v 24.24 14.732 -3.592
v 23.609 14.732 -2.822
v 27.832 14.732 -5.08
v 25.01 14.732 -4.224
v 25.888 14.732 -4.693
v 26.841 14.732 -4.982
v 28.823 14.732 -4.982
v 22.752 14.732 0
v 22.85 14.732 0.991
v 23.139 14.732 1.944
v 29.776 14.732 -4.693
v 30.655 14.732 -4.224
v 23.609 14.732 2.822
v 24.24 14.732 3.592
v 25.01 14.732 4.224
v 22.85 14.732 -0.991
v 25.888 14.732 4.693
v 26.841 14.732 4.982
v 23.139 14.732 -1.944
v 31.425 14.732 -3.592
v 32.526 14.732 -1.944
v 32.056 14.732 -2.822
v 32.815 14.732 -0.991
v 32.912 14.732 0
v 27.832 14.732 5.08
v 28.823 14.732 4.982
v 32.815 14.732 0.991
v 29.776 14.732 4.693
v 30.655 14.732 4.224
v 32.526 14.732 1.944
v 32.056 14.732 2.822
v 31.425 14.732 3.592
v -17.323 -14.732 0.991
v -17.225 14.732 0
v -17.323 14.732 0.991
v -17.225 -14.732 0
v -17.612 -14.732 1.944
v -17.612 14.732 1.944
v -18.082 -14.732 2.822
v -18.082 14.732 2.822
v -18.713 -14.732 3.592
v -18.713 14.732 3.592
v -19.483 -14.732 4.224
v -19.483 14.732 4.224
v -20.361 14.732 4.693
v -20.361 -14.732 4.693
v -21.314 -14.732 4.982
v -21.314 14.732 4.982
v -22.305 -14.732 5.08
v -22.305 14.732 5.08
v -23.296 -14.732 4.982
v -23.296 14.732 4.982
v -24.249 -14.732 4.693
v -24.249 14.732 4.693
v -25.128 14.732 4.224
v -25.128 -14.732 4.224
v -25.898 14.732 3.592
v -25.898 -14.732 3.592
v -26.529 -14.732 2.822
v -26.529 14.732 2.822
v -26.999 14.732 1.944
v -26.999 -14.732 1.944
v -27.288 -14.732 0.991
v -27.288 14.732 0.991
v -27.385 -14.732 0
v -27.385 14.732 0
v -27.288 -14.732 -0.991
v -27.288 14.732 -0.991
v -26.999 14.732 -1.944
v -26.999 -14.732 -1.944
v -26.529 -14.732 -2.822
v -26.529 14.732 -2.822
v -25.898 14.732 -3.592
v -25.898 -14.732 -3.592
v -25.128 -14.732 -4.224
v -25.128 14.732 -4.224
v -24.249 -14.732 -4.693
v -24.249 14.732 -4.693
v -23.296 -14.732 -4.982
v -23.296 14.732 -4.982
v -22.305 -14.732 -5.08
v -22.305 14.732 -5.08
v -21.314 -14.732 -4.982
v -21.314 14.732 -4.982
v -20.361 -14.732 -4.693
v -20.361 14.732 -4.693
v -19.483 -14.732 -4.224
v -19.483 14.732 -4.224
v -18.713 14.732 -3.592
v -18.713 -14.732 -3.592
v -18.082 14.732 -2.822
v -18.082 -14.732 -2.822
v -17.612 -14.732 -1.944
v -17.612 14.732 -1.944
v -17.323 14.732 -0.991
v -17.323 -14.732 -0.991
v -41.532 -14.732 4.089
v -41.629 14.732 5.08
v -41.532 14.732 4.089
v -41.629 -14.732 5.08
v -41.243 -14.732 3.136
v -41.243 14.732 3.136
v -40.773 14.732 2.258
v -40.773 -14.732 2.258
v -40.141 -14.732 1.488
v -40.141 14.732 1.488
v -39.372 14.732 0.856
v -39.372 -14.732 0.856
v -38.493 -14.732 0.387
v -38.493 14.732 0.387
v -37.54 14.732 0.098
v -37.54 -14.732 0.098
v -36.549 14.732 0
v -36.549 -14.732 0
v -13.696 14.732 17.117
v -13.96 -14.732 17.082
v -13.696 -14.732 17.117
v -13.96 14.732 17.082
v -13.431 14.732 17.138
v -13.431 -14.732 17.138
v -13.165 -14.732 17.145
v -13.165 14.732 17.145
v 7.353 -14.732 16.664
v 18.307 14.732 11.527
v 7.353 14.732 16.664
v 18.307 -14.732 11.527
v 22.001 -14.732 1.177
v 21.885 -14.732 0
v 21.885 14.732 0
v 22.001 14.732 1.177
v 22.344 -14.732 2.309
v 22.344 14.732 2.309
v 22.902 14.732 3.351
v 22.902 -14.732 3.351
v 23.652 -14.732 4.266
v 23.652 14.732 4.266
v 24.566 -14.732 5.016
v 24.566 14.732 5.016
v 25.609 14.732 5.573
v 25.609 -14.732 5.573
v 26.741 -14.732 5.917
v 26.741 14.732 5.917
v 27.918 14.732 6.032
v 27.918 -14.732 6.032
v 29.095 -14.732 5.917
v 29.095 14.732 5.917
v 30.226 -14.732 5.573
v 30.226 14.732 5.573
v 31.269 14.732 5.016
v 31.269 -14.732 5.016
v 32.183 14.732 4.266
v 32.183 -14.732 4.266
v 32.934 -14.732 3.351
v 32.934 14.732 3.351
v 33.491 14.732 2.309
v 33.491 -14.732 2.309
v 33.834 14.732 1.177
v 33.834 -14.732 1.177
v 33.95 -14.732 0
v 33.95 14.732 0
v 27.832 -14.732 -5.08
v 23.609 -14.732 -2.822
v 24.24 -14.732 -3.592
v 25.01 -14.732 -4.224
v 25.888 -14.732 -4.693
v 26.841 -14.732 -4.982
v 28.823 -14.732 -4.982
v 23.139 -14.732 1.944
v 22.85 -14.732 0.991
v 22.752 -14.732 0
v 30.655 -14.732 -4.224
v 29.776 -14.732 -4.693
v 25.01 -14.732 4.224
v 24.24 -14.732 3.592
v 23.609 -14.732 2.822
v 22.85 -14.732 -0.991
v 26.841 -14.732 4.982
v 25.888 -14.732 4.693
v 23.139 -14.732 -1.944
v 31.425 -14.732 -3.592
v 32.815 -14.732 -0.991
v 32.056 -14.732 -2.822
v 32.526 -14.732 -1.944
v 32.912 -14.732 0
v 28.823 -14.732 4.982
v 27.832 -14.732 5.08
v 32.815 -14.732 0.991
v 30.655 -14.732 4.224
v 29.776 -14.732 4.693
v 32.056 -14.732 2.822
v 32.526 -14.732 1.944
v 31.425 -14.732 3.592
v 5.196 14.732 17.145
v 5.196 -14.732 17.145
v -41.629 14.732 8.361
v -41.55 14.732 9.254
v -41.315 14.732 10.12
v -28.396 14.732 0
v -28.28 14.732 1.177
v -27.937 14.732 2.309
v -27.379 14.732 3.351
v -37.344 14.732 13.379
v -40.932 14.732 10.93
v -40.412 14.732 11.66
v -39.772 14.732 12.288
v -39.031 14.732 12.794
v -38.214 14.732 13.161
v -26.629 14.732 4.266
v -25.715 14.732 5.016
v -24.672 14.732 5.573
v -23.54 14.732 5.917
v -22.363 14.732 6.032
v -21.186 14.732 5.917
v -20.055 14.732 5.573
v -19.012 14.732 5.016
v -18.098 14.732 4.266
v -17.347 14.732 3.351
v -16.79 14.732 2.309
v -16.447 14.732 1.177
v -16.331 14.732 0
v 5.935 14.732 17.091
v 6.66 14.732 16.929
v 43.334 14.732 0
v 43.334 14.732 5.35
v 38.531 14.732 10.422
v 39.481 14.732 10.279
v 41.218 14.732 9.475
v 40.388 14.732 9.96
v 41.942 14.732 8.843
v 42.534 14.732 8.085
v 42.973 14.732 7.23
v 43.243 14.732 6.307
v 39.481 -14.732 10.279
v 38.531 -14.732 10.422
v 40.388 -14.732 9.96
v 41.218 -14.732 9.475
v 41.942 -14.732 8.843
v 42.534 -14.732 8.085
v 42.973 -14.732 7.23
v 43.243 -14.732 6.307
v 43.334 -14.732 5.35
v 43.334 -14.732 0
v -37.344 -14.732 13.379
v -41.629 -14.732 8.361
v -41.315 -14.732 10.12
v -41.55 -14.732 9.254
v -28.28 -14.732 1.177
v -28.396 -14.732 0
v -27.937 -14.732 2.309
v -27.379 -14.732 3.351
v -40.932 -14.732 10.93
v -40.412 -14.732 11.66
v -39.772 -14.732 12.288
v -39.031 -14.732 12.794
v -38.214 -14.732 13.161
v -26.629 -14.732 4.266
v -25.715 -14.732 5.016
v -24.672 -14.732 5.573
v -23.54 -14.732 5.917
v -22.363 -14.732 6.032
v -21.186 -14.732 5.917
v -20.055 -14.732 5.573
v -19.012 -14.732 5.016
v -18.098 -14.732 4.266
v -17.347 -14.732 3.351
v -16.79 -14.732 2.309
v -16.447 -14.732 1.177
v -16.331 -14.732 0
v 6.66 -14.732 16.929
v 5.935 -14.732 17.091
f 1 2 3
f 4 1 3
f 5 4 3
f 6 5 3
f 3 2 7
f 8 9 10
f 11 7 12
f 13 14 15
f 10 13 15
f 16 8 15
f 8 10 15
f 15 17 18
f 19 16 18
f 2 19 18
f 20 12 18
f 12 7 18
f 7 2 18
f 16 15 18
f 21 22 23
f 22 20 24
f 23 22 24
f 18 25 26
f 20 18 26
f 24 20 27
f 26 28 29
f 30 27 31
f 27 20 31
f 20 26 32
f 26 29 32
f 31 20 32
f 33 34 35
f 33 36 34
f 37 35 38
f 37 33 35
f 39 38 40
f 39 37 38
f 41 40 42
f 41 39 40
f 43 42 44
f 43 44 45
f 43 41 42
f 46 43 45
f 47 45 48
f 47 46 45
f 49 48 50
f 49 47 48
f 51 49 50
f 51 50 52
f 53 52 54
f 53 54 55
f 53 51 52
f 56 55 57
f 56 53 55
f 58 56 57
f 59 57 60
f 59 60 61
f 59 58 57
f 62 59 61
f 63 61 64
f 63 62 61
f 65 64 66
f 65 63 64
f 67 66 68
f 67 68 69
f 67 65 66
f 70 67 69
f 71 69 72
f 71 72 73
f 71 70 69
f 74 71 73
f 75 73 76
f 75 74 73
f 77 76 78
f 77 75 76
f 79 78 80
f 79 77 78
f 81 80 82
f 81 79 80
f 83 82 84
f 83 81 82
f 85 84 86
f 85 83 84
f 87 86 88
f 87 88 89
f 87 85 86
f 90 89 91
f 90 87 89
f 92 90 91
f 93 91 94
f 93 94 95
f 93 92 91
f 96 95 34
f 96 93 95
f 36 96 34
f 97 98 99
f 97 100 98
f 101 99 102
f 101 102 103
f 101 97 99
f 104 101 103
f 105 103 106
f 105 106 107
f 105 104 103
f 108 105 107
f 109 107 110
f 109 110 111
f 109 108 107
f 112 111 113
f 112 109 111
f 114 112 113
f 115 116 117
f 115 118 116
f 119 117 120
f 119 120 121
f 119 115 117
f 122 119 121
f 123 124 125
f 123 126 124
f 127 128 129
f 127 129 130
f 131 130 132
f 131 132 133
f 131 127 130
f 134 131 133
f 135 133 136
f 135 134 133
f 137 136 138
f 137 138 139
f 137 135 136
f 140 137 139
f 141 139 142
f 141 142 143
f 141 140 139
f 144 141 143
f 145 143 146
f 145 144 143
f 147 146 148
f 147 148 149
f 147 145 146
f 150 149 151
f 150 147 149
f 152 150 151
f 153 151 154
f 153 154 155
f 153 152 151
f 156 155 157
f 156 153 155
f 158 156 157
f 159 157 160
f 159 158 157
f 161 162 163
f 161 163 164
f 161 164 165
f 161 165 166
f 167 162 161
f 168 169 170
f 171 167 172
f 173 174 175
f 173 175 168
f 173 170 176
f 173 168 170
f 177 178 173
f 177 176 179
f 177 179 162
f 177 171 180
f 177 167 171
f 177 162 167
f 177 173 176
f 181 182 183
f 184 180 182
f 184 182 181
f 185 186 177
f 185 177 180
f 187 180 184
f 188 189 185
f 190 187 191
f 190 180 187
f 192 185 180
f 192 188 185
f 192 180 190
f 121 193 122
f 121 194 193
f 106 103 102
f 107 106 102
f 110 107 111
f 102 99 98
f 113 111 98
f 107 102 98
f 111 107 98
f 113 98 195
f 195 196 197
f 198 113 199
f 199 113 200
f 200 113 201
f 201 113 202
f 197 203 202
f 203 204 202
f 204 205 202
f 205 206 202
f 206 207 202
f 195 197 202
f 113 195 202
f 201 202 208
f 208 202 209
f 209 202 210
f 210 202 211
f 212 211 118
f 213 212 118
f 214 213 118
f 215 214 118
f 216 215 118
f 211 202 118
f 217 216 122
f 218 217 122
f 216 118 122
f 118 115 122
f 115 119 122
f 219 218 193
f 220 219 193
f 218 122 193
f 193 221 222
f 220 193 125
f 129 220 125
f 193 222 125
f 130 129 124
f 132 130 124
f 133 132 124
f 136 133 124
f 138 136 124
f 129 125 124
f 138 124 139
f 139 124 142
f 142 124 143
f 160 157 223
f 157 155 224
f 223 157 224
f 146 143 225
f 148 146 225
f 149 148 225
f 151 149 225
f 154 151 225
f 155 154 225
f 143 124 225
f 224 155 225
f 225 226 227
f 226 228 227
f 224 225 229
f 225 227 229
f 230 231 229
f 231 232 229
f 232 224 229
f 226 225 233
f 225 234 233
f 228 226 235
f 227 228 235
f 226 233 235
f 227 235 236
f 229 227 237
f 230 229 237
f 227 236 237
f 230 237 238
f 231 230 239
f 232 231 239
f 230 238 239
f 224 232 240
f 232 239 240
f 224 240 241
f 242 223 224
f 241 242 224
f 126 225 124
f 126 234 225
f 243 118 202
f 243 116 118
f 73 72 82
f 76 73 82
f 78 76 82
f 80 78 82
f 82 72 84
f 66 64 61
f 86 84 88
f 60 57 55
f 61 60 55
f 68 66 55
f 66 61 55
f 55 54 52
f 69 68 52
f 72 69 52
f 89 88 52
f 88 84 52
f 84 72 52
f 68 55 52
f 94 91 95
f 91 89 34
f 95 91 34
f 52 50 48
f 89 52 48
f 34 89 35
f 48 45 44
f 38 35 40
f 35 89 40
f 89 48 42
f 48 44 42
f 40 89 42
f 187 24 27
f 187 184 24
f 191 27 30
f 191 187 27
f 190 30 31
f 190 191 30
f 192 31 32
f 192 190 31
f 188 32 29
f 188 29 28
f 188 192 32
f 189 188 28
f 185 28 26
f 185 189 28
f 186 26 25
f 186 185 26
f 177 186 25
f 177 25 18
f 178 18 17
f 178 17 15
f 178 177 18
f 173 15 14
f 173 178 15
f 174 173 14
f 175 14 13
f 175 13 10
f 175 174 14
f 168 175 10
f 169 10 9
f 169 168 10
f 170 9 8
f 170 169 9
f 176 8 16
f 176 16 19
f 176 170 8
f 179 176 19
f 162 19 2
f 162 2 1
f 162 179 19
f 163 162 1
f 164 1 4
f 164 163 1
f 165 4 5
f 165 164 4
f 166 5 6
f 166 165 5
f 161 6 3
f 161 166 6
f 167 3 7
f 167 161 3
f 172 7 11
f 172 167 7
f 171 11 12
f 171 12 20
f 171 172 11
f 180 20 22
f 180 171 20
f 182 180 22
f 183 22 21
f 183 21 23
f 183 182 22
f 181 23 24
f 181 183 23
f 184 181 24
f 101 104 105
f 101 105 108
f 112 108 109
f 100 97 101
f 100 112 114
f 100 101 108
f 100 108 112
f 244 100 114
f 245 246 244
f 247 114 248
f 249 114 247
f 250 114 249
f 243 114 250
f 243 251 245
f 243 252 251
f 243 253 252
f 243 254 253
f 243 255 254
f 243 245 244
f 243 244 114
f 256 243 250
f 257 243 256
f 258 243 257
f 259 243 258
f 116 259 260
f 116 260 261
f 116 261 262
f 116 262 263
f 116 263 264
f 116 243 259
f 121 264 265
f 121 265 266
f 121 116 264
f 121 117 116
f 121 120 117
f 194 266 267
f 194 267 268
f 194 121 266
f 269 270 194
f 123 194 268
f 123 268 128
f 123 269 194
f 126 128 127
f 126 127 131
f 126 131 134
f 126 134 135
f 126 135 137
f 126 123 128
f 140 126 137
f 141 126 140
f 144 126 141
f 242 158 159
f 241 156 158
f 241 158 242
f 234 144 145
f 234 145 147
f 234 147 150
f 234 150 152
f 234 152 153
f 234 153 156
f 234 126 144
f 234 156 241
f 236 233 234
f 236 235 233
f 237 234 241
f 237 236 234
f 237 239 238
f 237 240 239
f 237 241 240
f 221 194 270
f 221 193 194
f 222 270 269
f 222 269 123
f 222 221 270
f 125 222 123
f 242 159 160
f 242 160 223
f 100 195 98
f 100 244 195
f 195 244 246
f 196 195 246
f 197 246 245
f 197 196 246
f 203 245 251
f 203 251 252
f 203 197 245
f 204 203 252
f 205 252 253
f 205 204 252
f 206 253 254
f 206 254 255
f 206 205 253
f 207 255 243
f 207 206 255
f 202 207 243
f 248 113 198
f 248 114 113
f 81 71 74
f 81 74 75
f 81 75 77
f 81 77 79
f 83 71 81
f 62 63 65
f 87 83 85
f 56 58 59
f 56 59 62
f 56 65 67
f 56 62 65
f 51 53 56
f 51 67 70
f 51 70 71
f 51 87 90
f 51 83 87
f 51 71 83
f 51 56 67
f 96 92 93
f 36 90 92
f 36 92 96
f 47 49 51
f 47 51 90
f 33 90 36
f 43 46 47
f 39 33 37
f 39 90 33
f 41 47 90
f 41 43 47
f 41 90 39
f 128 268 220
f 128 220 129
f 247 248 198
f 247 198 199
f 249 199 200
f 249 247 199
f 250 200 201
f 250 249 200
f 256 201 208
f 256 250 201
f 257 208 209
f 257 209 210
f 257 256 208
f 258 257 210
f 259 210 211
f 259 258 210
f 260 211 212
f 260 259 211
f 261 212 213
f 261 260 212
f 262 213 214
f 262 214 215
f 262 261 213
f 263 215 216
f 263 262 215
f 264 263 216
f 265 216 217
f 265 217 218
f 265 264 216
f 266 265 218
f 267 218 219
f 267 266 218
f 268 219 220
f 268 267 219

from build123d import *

# Parameters (mm, degrees)
F1_DEPTH = 14.732
F2_R     = 5.08
F3_DEPTH = 14.732
F4_R     = 5.08


with BuildPart() as f1:
    # F0 (on Front) → F1 (new body, symmetric)
    with BuildSketch(Plane.XZ):
        with BuildLine():
            Line((-41.6292596983, 12.7), (-41.6292596983, 0))
            Line((-41.6292596983, 0), (-28.3958129411, 0))
            ThreePointArc((-28.3958129411, 0), (-22.3633129411, 6.0325), (-16.3308129411, 0))
            Line((-16.3308129411, 0), (21.8852206534, 0))
            ThreePointArc((21.8852206534, 0), (27.9177206534, 6.0325), (33.9502206534, 0))
            Line((33.9502206534, 0), (43.3337403017, 0))
            Line((43.3337403017, 0), (43.3337403017, 10.16))
            Line((43.3337403017, 10.16), (18.307332794, 11.5266916706))
            Line((18.307332794, 11.5266916706), (6.327583626, 17.145))
            Line((6.327583626, 17.145), (-13.5646342155, 17.145))
            Line((-13.5646342155, 17.145), (-41.6292596983, 12.7))
        make_face()
    extrude(amount=F1_DEPTH, both=True)

    # F4
    f4_edges = [f1.edges().sort_by_distance(p)[0] for p in [
        (-41.62926, 0, 12.7),
        (43.33374, 0, 10.16),
        (6.327584, 0, 17.145),
        (-13.564634, 0, 17.145),
        (-41.62926, 0, 0),
    ]]
    fillet(f4_edges, radius=F4_R)


with BuildPart() as f3:
    # F2 (on Front) → F3 (new body, symmetric)
    with BuildSketch(Plane.XZ):
        with Locations((-22.3054196686, 0)):
            Circle(F2_R)
    extrude(amount=F3_DEPTH, both=True)


with BuildPart() as f3b:
    # F2 (on Front) → F3, piece 2 (new body, symmetric)
    with BuildSketch(Plane.XZ):
        with Locations((27.8324261308, 0)):
            Circle(F2_R)
    extrude(amount=F3_DEPTH, both=True)


solid = Compound([f1.part, f3.part, f3b.part])
